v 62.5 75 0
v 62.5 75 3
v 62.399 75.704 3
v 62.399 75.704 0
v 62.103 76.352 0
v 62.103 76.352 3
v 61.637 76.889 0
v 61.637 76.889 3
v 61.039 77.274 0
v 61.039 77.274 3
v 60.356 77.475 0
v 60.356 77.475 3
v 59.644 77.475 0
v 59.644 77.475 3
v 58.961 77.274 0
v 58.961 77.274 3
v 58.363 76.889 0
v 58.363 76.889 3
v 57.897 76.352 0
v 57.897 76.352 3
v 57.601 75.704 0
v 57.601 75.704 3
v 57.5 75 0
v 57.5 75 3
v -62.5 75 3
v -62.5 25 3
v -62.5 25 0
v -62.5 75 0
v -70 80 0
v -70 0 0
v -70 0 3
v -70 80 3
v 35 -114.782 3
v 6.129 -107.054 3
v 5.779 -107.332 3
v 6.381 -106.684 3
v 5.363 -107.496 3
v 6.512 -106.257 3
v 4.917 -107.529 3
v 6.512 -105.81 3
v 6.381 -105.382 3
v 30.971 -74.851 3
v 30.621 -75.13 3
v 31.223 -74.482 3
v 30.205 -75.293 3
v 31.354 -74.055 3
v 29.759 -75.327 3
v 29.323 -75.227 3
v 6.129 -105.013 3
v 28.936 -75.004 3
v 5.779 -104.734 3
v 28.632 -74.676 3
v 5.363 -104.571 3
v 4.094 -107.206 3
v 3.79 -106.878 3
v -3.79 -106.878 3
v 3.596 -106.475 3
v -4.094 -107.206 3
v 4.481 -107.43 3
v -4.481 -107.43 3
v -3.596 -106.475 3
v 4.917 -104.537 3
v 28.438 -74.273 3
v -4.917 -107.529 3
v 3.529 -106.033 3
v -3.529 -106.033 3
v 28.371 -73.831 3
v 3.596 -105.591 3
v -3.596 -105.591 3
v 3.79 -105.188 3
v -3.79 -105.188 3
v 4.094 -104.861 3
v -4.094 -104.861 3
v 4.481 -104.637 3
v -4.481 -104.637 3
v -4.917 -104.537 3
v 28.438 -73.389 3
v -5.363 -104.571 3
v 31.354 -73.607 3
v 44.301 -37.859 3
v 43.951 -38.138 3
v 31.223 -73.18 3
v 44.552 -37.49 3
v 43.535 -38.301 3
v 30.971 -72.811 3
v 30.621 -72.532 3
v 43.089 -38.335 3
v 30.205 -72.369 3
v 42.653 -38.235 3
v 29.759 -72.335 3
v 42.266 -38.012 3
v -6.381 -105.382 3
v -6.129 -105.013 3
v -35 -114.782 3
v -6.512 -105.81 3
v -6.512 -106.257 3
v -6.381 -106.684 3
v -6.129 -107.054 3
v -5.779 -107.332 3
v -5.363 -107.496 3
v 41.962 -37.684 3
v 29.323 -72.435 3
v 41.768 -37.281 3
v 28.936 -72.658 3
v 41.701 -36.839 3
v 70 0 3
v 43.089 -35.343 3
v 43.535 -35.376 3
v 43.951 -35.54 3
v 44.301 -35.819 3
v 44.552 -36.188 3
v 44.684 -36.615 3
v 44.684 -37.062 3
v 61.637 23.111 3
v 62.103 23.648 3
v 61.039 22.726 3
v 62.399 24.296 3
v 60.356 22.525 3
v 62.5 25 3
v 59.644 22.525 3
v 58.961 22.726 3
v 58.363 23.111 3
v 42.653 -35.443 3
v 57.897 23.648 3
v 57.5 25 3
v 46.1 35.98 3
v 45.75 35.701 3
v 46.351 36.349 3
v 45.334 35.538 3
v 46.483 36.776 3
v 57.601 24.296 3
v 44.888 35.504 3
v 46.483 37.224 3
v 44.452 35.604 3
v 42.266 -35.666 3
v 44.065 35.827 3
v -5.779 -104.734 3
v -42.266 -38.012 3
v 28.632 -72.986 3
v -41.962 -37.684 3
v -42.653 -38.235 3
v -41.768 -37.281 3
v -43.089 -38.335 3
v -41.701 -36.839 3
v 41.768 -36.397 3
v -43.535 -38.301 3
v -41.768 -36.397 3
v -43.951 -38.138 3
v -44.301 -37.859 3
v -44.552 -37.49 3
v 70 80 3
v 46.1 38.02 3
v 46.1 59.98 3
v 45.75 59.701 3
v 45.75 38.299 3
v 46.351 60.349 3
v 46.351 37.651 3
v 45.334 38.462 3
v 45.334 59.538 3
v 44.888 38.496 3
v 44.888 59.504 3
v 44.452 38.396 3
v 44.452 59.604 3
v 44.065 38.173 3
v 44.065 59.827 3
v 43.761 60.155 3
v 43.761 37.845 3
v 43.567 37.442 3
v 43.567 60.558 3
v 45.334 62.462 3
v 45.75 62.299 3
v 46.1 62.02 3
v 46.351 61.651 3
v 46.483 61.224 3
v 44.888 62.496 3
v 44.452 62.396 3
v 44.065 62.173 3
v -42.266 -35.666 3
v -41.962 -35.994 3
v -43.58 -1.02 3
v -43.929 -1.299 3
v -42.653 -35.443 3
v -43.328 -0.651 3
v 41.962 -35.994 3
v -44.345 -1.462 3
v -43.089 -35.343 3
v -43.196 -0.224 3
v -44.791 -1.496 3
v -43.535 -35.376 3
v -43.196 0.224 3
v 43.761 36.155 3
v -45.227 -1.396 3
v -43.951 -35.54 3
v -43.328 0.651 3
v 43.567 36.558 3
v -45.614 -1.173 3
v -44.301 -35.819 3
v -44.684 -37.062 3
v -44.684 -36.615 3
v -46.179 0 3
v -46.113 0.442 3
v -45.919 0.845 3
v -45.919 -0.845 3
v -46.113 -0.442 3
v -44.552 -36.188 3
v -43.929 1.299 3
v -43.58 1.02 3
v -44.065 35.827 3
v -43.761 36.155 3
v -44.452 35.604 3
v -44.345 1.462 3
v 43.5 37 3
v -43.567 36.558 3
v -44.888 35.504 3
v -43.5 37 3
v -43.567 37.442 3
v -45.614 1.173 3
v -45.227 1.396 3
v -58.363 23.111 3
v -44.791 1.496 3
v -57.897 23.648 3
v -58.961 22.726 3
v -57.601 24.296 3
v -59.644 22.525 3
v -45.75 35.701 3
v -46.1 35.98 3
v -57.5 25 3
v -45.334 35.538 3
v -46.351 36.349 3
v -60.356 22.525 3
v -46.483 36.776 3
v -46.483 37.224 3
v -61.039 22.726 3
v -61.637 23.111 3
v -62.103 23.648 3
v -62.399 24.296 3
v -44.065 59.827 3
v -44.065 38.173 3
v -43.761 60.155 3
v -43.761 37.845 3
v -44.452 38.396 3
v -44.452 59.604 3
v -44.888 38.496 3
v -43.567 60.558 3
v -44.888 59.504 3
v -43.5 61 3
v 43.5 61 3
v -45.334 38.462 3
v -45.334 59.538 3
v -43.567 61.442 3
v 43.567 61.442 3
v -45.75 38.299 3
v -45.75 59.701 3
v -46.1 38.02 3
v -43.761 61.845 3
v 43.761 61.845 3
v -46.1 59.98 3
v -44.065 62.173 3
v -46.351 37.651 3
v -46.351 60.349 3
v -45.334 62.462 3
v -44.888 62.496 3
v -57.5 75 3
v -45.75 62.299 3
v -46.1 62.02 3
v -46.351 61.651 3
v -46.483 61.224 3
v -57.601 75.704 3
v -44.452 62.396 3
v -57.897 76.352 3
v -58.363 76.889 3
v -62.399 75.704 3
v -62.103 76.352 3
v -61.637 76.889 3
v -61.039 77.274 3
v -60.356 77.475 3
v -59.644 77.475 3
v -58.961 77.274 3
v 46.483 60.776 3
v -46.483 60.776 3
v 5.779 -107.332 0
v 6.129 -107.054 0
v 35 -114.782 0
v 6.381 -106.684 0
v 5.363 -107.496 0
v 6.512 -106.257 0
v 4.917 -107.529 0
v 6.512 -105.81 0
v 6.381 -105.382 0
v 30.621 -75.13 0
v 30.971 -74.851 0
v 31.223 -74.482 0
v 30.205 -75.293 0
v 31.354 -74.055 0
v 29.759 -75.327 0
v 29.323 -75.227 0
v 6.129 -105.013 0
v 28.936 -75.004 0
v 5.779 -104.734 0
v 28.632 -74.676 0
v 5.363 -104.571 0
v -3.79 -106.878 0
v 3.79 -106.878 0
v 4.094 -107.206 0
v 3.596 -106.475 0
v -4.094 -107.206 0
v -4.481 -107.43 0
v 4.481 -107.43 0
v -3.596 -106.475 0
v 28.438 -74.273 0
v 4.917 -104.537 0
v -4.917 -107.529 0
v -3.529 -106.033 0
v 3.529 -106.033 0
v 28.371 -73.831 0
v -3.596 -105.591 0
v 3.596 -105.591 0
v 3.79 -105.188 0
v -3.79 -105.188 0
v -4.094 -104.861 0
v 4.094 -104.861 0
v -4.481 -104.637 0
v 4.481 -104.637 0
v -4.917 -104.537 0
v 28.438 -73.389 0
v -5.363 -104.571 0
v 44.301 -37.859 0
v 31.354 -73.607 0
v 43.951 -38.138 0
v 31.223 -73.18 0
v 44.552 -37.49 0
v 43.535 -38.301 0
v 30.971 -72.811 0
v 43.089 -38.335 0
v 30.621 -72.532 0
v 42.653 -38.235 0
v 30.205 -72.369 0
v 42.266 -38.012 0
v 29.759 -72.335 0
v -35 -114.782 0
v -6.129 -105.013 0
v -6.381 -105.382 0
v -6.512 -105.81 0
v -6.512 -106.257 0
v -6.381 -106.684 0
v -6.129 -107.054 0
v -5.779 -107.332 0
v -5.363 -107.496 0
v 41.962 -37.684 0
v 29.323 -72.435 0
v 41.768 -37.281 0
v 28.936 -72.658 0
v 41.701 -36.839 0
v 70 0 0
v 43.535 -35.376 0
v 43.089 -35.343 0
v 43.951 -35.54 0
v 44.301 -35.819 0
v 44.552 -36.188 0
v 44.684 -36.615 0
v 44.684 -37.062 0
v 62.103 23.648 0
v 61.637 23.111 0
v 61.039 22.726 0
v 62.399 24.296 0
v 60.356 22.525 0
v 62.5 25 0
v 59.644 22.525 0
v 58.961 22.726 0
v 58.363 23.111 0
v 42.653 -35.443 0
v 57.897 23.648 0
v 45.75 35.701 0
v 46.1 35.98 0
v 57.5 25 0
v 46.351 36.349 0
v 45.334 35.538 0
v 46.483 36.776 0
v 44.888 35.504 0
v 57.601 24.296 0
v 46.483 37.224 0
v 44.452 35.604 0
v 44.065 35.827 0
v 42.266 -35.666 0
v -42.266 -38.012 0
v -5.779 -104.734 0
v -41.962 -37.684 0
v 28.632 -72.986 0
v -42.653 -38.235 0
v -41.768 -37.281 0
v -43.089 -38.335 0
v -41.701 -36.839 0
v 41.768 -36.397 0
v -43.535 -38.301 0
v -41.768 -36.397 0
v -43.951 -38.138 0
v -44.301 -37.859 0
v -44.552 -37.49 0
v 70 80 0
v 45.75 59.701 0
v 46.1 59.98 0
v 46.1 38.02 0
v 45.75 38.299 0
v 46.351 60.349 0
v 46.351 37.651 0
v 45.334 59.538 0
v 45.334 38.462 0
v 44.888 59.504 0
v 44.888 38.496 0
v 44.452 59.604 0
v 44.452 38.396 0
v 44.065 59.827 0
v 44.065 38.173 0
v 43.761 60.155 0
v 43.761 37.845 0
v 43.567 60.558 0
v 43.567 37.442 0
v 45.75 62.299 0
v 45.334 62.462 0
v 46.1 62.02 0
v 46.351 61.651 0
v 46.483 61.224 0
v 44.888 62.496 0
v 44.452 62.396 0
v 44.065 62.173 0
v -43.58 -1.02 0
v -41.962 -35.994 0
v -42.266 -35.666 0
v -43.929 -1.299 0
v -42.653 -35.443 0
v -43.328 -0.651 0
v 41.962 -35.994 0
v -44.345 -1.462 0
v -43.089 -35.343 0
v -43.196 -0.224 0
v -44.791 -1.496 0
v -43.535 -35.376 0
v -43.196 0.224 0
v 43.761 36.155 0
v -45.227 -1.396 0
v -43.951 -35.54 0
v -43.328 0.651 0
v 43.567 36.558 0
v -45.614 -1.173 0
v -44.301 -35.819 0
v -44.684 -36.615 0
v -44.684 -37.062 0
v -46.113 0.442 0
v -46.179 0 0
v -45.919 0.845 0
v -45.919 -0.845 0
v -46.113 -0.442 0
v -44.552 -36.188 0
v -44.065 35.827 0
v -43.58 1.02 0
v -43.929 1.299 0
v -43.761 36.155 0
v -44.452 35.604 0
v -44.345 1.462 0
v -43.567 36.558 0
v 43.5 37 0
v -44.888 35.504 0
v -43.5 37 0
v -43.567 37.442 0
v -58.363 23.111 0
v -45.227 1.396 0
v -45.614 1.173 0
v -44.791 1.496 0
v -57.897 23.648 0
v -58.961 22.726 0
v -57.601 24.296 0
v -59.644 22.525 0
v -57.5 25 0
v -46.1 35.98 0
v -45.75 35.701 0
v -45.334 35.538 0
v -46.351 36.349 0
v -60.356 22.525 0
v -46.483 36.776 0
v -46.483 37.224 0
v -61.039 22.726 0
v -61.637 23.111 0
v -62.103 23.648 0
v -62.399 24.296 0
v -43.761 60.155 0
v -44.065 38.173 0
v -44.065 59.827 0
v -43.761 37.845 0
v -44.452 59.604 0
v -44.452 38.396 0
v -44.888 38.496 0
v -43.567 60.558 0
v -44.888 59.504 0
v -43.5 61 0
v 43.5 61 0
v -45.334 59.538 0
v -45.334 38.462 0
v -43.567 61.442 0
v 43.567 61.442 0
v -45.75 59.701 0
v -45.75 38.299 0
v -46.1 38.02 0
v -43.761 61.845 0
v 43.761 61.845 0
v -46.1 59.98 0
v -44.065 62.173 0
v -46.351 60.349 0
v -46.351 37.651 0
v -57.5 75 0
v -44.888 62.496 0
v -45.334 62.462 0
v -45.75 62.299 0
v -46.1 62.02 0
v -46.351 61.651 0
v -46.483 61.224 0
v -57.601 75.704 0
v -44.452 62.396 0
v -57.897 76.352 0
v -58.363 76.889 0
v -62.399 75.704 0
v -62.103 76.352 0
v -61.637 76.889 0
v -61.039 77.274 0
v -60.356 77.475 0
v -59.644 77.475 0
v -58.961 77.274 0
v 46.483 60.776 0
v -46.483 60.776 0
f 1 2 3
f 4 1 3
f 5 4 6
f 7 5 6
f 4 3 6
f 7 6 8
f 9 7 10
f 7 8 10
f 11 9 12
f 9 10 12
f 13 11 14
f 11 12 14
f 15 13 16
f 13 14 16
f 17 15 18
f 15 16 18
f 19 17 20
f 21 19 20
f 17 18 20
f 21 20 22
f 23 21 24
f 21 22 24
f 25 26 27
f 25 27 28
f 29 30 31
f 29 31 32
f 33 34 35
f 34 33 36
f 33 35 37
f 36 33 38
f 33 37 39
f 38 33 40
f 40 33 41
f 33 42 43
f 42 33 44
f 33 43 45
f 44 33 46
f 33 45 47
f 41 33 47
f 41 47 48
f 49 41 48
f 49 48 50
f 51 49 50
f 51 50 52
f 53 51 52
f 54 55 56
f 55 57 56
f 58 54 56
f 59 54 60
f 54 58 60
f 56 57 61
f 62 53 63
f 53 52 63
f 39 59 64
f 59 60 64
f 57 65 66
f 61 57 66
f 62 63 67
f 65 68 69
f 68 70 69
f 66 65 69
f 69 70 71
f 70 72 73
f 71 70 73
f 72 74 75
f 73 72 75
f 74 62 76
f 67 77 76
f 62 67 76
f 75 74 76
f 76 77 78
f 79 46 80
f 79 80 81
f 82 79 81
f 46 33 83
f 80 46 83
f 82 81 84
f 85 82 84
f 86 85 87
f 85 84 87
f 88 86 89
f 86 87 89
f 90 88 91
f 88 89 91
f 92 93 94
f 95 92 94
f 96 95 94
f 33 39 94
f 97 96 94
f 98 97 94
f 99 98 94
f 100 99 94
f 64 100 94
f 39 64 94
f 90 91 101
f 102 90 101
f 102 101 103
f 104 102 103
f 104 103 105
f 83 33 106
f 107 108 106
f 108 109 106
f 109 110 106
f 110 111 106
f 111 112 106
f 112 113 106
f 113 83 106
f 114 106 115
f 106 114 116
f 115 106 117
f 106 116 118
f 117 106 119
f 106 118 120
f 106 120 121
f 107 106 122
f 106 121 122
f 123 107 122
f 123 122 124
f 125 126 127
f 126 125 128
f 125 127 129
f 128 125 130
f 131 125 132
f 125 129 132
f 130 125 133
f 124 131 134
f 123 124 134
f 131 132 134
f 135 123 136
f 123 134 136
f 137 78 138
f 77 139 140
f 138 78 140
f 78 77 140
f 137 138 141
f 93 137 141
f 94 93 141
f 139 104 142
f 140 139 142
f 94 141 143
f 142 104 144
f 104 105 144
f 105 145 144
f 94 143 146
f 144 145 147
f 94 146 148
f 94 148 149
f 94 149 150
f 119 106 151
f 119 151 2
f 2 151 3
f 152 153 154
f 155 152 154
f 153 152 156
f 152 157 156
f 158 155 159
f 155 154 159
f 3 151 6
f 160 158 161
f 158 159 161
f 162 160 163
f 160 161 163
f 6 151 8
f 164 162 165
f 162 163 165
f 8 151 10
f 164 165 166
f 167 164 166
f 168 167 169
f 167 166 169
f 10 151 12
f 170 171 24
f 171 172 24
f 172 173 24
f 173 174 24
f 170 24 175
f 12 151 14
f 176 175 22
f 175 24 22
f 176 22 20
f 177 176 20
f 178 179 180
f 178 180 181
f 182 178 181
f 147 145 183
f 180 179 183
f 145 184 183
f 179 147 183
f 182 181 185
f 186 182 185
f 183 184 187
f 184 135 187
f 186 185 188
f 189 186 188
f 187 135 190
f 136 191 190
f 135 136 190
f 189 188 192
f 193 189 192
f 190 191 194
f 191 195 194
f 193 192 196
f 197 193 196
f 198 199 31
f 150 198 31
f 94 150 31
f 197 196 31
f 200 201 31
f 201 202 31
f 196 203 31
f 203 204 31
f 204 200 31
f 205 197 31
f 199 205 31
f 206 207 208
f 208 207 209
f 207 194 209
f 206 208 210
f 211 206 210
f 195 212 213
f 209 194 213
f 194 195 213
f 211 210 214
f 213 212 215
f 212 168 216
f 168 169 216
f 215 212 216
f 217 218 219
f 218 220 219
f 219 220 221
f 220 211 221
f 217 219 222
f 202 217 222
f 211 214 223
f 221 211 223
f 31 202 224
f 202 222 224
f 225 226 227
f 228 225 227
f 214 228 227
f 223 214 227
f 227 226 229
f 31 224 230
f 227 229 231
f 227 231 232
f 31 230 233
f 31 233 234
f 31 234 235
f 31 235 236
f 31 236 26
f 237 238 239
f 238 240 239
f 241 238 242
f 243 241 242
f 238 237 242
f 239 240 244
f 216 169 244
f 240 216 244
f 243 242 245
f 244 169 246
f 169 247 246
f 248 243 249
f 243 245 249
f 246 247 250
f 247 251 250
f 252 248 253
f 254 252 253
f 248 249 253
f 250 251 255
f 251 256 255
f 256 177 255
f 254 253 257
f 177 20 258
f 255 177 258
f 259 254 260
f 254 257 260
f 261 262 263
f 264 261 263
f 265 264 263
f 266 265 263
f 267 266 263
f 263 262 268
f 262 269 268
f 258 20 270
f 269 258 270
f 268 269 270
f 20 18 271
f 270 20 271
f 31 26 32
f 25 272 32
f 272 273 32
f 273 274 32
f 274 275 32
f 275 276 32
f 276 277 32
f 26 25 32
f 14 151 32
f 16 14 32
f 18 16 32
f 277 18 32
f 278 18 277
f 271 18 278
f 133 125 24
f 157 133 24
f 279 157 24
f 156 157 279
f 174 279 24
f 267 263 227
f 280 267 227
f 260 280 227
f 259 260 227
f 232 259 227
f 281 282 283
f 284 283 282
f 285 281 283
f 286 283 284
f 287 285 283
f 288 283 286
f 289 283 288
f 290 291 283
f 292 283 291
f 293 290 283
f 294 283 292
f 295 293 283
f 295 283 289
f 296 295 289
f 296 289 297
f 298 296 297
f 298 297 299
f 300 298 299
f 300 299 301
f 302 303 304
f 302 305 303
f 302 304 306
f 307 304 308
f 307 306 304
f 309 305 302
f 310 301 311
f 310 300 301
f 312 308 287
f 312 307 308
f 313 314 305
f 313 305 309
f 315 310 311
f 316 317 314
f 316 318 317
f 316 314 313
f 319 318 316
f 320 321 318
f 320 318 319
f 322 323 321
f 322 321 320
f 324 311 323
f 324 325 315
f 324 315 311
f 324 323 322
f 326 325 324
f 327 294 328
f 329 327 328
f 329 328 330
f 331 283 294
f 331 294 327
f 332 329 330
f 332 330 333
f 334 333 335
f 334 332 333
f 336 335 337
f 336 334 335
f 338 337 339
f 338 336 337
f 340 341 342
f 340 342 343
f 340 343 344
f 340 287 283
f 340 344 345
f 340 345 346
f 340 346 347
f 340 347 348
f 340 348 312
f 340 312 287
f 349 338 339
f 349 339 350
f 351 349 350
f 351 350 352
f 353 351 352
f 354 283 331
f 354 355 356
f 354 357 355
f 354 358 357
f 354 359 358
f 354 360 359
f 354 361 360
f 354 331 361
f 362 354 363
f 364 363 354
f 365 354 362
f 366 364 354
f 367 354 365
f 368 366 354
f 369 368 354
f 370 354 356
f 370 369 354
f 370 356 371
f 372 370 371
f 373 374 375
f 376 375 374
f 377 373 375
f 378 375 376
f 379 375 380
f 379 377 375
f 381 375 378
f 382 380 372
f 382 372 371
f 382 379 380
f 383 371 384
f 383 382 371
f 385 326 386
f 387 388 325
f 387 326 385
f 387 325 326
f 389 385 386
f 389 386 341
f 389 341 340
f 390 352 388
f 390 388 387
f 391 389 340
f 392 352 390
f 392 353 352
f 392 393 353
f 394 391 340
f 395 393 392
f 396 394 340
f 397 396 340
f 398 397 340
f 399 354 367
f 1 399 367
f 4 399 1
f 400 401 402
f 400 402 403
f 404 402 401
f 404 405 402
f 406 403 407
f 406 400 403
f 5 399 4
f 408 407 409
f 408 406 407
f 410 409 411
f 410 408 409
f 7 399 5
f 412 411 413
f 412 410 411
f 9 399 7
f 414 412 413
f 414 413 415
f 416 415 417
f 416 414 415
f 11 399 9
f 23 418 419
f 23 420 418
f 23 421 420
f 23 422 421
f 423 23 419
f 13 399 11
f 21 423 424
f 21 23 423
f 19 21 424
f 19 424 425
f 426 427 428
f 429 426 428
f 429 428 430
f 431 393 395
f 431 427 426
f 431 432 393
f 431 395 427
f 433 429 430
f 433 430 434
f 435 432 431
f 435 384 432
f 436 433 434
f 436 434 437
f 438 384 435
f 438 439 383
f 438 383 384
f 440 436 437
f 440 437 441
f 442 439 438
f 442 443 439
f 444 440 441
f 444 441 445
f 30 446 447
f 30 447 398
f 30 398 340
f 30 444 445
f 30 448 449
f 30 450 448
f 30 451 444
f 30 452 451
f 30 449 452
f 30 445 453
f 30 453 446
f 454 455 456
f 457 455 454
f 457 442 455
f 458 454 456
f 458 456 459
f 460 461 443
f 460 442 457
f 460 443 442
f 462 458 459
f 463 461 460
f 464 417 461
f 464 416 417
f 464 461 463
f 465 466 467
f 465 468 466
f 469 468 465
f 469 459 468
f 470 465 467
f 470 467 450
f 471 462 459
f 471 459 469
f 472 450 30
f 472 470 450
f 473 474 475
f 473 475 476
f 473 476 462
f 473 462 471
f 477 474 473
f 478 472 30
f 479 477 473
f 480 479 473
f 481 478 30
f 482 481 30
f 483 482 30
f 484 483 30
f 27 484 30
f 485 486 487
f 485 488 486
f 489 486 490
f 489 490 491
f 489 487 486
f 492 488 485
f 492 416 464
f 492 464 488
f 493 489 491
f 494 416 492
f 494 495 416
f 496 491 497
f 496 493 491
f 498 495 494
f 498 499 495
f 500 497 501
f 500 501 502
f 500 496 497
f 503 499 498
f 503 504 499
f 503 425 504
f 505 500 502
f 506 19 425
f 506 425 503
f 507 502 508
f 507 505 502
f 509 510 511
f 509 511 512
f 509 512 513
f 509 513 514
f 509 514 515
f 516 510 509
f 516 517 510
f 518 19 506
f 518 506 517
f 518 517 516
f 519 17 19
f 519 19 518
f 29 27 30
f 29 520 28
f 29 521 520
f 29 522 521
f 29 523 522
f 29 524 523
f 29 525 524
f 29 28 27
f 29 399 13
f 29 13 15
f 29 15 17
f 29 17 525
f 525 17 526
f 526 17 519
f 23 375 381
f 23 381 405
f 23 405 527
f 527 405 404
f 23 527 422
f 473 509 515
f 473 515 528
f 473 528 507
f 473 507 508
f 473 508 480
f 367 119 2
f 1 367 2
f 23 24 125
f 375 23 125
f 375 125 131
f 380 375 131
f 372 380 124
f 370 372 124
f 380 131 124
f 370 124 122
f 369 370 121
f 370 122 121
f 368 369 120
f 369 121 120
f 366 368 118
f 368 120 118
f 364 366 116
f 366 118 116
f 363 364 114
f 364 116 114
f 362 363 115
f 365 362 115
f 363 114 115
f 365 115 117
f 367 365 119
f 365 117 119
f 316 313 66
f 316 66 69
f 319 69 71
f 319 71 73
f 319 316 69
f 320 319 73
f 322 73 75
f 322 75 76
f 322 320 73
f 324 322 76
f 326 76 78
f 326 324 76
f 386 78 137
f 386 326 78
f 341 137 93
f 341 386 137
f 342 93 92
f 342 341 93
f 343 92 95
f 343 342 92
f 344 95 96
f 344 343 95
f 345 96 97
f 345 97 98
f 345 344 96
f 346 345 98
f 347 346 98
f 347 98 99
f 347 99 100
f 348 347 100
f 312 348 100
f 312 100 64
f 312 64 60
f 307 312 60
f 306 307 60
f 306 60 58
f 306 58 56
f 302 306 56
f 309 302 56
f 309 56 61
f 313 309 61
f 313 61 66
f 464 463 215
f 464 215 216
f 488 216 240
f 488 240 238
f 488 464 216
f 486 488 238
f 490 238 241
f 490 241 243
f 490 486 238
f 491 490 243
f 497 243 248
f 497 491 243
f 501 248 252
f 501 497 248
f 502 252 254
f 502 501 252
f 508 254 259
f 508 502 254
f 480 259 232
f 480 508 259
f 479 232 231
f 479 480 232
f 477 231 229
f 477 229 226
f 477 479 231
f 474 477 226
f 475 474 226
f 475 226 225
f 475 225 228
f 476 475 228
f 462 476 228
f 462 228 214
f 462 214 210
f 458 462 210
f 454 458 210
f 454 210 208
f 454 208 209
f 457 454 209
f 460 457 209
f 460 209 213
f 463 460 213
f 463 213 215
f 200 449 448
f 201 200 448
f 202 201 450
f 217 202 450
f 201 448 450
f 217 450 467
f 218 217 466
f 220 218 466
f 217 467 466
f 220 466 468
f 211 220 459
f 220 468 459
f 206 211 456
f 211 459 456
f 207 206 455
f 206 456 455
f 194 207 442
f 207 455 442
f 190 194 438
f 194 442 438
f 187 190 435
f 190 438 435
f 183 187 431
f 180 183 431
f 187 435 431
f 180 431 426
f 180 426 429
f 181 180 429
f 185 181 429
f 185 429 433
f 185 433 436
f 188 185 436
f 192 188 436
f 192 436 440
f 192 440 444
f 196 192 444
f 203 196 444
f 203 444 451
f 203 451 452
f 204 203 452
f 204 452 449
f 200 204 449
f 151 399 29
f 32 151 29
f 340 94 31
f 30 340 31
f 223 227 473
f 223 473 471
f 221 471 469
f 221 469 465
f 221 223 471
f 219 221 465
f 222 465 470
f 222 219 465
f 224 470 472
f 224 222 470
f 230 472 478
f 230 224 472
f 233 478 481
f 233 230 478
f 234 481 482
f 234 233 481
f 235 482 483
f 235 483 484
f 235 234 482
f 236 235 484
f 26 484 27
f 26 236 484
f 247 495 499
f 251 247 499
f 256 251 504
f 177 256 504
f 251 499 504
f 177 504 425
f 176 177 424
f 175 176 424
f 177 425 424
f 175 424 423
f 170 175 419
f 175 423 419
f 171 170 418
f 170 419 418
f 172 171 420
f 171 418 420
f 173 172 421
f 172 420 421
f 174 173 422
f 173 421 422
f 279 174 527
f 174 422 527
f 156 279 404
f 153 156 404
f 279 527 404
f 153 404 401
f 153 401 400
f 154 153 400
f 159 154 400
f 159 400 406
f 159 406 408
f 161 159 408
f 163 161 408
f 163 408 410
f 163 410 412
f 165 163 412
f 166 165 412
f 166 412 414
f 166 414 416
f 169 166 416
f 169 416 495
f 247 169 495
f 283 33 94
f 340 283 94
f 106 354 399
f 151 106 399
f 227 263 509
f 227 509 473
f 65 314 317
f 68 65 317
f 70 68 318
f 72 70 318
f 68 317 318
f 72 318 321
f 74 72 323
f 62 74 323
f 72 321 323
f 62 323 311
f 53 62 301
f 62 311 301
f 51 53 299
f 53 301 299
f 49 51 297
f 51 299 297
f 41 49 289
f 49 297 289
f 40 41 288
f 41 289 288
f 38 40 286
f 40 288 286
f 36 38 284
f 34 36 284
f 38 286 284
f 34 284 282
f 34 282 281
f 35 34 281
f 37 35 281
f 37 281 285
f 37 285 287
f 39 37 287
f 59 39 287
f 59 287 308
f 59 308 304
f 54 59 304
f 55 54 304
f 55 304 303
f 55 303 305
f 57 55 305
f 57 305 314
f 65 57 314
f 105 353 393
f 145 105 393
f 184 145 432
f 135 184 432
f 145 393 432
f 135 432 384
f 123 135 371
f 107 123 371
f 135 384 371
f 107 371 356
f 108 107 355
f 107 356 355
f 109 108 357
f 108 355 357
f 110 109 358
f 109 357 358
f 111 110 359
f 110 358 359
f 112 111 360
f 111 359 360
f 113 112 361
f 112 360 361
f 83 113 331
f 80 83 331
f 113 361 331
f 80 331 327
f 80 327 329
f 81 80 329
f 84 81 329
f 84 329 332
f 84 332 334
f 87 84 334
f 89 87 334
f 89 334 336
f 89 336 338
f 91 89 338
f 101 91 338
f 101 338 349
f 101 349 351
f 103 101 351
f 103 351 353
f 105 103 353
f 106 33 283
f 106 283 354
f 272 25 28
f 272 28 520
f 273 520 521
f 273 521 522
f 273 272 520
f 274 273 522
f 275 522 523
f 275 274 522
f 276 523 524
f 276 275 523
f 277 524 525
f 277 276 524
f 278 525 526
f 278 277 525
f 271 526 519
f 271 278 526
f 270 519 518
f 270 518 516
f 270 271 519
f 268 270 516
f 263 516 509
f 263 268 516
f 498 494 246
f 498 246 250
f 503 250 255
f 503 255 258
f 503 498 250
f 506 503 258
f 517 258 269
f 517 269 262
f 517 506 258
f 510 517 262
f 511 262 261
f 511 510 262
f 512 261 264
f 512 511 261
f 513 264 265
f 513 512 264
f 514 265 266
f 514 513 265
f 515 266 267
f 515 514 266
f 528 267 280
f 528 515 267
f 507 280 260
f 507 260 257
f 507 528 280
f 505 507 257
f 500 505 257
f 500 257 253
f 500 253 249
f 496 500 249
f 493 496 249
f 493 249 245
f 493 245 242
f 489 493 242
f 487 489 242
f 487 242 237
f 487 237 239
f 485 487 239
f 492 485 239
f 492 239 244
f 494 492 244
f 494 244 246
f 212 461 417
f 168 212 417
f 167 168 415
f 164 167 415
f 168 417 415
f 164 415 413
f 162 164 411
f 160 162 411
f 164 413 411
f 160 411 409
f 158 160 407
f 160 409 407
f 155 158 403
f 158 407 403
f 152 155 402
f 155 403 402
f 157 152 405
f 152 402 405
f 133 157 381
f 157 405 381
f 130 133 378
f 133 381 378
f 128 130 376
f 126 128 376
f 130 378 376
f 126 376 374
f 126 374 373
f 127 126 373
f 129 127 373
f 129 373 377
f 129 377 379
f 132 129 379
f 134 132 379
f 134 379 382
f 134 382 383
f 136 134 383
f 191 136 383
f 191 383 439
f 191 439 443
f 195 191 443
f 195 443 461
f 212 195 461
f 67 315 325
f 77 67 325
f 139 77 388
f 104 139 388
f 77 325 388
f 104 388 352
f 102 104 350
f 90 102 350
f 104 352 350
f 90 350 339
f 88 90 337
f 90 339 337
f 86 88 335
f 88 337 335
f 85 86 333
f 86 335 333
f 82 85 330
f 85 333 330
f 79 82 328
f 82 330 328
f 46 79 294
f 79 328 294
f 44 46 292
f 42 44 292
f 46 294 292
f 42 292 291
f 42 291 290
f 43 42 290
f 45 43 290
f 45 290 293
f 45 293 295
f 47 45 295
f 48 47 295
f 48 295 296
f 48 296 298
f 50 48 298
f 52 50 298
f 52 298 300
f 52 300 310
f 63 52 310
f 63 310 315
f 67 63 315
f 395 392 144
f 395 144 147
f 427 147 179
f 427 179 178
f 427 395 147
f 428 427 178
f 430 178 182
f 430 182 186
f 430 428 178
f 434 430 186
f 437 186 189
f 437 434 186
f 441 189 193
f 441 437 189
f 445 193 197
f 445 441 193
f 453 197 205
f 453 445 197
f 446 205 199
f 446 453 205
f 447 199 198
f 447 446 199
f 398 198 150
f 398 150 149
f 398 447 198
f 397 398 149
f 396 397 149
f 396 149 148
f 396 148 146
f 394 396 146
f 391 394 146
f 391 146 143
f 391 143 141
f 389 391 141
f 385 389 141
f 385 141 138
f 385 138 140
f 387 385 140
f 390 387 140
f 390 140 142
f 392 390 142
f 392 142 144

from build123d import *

# Parameters (mm, degrees)
F0_W      = 70
F0_H      = 80
F1_DEPTH  = 3
F3_D      = 3
F7_DEPTH  = 3
F9_D      = 3
F11_D     = 3
F12_DEPTH = 25
F15_D     = 3
F17_D     = 3


with BuildPart() as f1:
    # F0 (on Top) → F1 (new body)
    with BuildSketch(Plane.XY):
        with Locations((35, 40)):
            Rectangle(F0_W, F0_H)
    extrude(amount=F1_DEPTH)

    # F3 (through all)
    with Locations(Plane.XY.offset(3)):
        with Locations((45, 61), (45, 37)):
            Hole(F3_D / 2)

    # F6 (on face) → F7 (join)
    with BuildSketch(Plane.XY.offset(3)):
        Polygon((35, -114.782403), (70, 0), (0, 0), (0, -114.782403), align=None)
    extrude(amount=-F7_DEPTH)

    # F9 (through all)
    with Locations(Plane.XY.offset(3)):
        with Locations((-41.79904, -36.838889), (43.20096, -36.838889)):
            Hole(F9_D / 2)

    # F11 (through all)
    with Locations(Plane.XY.offset(3)):
        with Locations((-13.970835, -106.033295), (5.029165, -106.033295)):
            Hole(F11_D / 2)

    # F5 (on face) → F12 (cut)
    with BuildSketch(Plane.XY.offset(3)):
        with BuildLine():
            ThreePointArc((62.5, 75), (60, 77.5), (57.5, 75))
            Line((57.5, 75), (57.5, 25))
            ThreePointArc((57.5, 25), (60, 22.5), (62.5, 25))
            Line((62.5, 25), (62.5, 75))
        make_face()
    extrude(amount=-F12_DEPTH, mode=Mode.SUBTRACT)

    # F14: F1 across plane


with BuildPart() as f1_1:
    add(f1.part)
    add(f1.part.mirror(Plane.YZ))

    # F15 (through all)
    with Locations(Plane.XY.offset(3)):
        with Locations((29.87123, -73.830966)):
            Hole(F15_D / 2)

    # F17 (through all)
    with Locations(Plane.XY.offset(3)):
        with Locations((-44.679251, 0)):
            Hole(F17_D / 2)


solid = f1_1.part
